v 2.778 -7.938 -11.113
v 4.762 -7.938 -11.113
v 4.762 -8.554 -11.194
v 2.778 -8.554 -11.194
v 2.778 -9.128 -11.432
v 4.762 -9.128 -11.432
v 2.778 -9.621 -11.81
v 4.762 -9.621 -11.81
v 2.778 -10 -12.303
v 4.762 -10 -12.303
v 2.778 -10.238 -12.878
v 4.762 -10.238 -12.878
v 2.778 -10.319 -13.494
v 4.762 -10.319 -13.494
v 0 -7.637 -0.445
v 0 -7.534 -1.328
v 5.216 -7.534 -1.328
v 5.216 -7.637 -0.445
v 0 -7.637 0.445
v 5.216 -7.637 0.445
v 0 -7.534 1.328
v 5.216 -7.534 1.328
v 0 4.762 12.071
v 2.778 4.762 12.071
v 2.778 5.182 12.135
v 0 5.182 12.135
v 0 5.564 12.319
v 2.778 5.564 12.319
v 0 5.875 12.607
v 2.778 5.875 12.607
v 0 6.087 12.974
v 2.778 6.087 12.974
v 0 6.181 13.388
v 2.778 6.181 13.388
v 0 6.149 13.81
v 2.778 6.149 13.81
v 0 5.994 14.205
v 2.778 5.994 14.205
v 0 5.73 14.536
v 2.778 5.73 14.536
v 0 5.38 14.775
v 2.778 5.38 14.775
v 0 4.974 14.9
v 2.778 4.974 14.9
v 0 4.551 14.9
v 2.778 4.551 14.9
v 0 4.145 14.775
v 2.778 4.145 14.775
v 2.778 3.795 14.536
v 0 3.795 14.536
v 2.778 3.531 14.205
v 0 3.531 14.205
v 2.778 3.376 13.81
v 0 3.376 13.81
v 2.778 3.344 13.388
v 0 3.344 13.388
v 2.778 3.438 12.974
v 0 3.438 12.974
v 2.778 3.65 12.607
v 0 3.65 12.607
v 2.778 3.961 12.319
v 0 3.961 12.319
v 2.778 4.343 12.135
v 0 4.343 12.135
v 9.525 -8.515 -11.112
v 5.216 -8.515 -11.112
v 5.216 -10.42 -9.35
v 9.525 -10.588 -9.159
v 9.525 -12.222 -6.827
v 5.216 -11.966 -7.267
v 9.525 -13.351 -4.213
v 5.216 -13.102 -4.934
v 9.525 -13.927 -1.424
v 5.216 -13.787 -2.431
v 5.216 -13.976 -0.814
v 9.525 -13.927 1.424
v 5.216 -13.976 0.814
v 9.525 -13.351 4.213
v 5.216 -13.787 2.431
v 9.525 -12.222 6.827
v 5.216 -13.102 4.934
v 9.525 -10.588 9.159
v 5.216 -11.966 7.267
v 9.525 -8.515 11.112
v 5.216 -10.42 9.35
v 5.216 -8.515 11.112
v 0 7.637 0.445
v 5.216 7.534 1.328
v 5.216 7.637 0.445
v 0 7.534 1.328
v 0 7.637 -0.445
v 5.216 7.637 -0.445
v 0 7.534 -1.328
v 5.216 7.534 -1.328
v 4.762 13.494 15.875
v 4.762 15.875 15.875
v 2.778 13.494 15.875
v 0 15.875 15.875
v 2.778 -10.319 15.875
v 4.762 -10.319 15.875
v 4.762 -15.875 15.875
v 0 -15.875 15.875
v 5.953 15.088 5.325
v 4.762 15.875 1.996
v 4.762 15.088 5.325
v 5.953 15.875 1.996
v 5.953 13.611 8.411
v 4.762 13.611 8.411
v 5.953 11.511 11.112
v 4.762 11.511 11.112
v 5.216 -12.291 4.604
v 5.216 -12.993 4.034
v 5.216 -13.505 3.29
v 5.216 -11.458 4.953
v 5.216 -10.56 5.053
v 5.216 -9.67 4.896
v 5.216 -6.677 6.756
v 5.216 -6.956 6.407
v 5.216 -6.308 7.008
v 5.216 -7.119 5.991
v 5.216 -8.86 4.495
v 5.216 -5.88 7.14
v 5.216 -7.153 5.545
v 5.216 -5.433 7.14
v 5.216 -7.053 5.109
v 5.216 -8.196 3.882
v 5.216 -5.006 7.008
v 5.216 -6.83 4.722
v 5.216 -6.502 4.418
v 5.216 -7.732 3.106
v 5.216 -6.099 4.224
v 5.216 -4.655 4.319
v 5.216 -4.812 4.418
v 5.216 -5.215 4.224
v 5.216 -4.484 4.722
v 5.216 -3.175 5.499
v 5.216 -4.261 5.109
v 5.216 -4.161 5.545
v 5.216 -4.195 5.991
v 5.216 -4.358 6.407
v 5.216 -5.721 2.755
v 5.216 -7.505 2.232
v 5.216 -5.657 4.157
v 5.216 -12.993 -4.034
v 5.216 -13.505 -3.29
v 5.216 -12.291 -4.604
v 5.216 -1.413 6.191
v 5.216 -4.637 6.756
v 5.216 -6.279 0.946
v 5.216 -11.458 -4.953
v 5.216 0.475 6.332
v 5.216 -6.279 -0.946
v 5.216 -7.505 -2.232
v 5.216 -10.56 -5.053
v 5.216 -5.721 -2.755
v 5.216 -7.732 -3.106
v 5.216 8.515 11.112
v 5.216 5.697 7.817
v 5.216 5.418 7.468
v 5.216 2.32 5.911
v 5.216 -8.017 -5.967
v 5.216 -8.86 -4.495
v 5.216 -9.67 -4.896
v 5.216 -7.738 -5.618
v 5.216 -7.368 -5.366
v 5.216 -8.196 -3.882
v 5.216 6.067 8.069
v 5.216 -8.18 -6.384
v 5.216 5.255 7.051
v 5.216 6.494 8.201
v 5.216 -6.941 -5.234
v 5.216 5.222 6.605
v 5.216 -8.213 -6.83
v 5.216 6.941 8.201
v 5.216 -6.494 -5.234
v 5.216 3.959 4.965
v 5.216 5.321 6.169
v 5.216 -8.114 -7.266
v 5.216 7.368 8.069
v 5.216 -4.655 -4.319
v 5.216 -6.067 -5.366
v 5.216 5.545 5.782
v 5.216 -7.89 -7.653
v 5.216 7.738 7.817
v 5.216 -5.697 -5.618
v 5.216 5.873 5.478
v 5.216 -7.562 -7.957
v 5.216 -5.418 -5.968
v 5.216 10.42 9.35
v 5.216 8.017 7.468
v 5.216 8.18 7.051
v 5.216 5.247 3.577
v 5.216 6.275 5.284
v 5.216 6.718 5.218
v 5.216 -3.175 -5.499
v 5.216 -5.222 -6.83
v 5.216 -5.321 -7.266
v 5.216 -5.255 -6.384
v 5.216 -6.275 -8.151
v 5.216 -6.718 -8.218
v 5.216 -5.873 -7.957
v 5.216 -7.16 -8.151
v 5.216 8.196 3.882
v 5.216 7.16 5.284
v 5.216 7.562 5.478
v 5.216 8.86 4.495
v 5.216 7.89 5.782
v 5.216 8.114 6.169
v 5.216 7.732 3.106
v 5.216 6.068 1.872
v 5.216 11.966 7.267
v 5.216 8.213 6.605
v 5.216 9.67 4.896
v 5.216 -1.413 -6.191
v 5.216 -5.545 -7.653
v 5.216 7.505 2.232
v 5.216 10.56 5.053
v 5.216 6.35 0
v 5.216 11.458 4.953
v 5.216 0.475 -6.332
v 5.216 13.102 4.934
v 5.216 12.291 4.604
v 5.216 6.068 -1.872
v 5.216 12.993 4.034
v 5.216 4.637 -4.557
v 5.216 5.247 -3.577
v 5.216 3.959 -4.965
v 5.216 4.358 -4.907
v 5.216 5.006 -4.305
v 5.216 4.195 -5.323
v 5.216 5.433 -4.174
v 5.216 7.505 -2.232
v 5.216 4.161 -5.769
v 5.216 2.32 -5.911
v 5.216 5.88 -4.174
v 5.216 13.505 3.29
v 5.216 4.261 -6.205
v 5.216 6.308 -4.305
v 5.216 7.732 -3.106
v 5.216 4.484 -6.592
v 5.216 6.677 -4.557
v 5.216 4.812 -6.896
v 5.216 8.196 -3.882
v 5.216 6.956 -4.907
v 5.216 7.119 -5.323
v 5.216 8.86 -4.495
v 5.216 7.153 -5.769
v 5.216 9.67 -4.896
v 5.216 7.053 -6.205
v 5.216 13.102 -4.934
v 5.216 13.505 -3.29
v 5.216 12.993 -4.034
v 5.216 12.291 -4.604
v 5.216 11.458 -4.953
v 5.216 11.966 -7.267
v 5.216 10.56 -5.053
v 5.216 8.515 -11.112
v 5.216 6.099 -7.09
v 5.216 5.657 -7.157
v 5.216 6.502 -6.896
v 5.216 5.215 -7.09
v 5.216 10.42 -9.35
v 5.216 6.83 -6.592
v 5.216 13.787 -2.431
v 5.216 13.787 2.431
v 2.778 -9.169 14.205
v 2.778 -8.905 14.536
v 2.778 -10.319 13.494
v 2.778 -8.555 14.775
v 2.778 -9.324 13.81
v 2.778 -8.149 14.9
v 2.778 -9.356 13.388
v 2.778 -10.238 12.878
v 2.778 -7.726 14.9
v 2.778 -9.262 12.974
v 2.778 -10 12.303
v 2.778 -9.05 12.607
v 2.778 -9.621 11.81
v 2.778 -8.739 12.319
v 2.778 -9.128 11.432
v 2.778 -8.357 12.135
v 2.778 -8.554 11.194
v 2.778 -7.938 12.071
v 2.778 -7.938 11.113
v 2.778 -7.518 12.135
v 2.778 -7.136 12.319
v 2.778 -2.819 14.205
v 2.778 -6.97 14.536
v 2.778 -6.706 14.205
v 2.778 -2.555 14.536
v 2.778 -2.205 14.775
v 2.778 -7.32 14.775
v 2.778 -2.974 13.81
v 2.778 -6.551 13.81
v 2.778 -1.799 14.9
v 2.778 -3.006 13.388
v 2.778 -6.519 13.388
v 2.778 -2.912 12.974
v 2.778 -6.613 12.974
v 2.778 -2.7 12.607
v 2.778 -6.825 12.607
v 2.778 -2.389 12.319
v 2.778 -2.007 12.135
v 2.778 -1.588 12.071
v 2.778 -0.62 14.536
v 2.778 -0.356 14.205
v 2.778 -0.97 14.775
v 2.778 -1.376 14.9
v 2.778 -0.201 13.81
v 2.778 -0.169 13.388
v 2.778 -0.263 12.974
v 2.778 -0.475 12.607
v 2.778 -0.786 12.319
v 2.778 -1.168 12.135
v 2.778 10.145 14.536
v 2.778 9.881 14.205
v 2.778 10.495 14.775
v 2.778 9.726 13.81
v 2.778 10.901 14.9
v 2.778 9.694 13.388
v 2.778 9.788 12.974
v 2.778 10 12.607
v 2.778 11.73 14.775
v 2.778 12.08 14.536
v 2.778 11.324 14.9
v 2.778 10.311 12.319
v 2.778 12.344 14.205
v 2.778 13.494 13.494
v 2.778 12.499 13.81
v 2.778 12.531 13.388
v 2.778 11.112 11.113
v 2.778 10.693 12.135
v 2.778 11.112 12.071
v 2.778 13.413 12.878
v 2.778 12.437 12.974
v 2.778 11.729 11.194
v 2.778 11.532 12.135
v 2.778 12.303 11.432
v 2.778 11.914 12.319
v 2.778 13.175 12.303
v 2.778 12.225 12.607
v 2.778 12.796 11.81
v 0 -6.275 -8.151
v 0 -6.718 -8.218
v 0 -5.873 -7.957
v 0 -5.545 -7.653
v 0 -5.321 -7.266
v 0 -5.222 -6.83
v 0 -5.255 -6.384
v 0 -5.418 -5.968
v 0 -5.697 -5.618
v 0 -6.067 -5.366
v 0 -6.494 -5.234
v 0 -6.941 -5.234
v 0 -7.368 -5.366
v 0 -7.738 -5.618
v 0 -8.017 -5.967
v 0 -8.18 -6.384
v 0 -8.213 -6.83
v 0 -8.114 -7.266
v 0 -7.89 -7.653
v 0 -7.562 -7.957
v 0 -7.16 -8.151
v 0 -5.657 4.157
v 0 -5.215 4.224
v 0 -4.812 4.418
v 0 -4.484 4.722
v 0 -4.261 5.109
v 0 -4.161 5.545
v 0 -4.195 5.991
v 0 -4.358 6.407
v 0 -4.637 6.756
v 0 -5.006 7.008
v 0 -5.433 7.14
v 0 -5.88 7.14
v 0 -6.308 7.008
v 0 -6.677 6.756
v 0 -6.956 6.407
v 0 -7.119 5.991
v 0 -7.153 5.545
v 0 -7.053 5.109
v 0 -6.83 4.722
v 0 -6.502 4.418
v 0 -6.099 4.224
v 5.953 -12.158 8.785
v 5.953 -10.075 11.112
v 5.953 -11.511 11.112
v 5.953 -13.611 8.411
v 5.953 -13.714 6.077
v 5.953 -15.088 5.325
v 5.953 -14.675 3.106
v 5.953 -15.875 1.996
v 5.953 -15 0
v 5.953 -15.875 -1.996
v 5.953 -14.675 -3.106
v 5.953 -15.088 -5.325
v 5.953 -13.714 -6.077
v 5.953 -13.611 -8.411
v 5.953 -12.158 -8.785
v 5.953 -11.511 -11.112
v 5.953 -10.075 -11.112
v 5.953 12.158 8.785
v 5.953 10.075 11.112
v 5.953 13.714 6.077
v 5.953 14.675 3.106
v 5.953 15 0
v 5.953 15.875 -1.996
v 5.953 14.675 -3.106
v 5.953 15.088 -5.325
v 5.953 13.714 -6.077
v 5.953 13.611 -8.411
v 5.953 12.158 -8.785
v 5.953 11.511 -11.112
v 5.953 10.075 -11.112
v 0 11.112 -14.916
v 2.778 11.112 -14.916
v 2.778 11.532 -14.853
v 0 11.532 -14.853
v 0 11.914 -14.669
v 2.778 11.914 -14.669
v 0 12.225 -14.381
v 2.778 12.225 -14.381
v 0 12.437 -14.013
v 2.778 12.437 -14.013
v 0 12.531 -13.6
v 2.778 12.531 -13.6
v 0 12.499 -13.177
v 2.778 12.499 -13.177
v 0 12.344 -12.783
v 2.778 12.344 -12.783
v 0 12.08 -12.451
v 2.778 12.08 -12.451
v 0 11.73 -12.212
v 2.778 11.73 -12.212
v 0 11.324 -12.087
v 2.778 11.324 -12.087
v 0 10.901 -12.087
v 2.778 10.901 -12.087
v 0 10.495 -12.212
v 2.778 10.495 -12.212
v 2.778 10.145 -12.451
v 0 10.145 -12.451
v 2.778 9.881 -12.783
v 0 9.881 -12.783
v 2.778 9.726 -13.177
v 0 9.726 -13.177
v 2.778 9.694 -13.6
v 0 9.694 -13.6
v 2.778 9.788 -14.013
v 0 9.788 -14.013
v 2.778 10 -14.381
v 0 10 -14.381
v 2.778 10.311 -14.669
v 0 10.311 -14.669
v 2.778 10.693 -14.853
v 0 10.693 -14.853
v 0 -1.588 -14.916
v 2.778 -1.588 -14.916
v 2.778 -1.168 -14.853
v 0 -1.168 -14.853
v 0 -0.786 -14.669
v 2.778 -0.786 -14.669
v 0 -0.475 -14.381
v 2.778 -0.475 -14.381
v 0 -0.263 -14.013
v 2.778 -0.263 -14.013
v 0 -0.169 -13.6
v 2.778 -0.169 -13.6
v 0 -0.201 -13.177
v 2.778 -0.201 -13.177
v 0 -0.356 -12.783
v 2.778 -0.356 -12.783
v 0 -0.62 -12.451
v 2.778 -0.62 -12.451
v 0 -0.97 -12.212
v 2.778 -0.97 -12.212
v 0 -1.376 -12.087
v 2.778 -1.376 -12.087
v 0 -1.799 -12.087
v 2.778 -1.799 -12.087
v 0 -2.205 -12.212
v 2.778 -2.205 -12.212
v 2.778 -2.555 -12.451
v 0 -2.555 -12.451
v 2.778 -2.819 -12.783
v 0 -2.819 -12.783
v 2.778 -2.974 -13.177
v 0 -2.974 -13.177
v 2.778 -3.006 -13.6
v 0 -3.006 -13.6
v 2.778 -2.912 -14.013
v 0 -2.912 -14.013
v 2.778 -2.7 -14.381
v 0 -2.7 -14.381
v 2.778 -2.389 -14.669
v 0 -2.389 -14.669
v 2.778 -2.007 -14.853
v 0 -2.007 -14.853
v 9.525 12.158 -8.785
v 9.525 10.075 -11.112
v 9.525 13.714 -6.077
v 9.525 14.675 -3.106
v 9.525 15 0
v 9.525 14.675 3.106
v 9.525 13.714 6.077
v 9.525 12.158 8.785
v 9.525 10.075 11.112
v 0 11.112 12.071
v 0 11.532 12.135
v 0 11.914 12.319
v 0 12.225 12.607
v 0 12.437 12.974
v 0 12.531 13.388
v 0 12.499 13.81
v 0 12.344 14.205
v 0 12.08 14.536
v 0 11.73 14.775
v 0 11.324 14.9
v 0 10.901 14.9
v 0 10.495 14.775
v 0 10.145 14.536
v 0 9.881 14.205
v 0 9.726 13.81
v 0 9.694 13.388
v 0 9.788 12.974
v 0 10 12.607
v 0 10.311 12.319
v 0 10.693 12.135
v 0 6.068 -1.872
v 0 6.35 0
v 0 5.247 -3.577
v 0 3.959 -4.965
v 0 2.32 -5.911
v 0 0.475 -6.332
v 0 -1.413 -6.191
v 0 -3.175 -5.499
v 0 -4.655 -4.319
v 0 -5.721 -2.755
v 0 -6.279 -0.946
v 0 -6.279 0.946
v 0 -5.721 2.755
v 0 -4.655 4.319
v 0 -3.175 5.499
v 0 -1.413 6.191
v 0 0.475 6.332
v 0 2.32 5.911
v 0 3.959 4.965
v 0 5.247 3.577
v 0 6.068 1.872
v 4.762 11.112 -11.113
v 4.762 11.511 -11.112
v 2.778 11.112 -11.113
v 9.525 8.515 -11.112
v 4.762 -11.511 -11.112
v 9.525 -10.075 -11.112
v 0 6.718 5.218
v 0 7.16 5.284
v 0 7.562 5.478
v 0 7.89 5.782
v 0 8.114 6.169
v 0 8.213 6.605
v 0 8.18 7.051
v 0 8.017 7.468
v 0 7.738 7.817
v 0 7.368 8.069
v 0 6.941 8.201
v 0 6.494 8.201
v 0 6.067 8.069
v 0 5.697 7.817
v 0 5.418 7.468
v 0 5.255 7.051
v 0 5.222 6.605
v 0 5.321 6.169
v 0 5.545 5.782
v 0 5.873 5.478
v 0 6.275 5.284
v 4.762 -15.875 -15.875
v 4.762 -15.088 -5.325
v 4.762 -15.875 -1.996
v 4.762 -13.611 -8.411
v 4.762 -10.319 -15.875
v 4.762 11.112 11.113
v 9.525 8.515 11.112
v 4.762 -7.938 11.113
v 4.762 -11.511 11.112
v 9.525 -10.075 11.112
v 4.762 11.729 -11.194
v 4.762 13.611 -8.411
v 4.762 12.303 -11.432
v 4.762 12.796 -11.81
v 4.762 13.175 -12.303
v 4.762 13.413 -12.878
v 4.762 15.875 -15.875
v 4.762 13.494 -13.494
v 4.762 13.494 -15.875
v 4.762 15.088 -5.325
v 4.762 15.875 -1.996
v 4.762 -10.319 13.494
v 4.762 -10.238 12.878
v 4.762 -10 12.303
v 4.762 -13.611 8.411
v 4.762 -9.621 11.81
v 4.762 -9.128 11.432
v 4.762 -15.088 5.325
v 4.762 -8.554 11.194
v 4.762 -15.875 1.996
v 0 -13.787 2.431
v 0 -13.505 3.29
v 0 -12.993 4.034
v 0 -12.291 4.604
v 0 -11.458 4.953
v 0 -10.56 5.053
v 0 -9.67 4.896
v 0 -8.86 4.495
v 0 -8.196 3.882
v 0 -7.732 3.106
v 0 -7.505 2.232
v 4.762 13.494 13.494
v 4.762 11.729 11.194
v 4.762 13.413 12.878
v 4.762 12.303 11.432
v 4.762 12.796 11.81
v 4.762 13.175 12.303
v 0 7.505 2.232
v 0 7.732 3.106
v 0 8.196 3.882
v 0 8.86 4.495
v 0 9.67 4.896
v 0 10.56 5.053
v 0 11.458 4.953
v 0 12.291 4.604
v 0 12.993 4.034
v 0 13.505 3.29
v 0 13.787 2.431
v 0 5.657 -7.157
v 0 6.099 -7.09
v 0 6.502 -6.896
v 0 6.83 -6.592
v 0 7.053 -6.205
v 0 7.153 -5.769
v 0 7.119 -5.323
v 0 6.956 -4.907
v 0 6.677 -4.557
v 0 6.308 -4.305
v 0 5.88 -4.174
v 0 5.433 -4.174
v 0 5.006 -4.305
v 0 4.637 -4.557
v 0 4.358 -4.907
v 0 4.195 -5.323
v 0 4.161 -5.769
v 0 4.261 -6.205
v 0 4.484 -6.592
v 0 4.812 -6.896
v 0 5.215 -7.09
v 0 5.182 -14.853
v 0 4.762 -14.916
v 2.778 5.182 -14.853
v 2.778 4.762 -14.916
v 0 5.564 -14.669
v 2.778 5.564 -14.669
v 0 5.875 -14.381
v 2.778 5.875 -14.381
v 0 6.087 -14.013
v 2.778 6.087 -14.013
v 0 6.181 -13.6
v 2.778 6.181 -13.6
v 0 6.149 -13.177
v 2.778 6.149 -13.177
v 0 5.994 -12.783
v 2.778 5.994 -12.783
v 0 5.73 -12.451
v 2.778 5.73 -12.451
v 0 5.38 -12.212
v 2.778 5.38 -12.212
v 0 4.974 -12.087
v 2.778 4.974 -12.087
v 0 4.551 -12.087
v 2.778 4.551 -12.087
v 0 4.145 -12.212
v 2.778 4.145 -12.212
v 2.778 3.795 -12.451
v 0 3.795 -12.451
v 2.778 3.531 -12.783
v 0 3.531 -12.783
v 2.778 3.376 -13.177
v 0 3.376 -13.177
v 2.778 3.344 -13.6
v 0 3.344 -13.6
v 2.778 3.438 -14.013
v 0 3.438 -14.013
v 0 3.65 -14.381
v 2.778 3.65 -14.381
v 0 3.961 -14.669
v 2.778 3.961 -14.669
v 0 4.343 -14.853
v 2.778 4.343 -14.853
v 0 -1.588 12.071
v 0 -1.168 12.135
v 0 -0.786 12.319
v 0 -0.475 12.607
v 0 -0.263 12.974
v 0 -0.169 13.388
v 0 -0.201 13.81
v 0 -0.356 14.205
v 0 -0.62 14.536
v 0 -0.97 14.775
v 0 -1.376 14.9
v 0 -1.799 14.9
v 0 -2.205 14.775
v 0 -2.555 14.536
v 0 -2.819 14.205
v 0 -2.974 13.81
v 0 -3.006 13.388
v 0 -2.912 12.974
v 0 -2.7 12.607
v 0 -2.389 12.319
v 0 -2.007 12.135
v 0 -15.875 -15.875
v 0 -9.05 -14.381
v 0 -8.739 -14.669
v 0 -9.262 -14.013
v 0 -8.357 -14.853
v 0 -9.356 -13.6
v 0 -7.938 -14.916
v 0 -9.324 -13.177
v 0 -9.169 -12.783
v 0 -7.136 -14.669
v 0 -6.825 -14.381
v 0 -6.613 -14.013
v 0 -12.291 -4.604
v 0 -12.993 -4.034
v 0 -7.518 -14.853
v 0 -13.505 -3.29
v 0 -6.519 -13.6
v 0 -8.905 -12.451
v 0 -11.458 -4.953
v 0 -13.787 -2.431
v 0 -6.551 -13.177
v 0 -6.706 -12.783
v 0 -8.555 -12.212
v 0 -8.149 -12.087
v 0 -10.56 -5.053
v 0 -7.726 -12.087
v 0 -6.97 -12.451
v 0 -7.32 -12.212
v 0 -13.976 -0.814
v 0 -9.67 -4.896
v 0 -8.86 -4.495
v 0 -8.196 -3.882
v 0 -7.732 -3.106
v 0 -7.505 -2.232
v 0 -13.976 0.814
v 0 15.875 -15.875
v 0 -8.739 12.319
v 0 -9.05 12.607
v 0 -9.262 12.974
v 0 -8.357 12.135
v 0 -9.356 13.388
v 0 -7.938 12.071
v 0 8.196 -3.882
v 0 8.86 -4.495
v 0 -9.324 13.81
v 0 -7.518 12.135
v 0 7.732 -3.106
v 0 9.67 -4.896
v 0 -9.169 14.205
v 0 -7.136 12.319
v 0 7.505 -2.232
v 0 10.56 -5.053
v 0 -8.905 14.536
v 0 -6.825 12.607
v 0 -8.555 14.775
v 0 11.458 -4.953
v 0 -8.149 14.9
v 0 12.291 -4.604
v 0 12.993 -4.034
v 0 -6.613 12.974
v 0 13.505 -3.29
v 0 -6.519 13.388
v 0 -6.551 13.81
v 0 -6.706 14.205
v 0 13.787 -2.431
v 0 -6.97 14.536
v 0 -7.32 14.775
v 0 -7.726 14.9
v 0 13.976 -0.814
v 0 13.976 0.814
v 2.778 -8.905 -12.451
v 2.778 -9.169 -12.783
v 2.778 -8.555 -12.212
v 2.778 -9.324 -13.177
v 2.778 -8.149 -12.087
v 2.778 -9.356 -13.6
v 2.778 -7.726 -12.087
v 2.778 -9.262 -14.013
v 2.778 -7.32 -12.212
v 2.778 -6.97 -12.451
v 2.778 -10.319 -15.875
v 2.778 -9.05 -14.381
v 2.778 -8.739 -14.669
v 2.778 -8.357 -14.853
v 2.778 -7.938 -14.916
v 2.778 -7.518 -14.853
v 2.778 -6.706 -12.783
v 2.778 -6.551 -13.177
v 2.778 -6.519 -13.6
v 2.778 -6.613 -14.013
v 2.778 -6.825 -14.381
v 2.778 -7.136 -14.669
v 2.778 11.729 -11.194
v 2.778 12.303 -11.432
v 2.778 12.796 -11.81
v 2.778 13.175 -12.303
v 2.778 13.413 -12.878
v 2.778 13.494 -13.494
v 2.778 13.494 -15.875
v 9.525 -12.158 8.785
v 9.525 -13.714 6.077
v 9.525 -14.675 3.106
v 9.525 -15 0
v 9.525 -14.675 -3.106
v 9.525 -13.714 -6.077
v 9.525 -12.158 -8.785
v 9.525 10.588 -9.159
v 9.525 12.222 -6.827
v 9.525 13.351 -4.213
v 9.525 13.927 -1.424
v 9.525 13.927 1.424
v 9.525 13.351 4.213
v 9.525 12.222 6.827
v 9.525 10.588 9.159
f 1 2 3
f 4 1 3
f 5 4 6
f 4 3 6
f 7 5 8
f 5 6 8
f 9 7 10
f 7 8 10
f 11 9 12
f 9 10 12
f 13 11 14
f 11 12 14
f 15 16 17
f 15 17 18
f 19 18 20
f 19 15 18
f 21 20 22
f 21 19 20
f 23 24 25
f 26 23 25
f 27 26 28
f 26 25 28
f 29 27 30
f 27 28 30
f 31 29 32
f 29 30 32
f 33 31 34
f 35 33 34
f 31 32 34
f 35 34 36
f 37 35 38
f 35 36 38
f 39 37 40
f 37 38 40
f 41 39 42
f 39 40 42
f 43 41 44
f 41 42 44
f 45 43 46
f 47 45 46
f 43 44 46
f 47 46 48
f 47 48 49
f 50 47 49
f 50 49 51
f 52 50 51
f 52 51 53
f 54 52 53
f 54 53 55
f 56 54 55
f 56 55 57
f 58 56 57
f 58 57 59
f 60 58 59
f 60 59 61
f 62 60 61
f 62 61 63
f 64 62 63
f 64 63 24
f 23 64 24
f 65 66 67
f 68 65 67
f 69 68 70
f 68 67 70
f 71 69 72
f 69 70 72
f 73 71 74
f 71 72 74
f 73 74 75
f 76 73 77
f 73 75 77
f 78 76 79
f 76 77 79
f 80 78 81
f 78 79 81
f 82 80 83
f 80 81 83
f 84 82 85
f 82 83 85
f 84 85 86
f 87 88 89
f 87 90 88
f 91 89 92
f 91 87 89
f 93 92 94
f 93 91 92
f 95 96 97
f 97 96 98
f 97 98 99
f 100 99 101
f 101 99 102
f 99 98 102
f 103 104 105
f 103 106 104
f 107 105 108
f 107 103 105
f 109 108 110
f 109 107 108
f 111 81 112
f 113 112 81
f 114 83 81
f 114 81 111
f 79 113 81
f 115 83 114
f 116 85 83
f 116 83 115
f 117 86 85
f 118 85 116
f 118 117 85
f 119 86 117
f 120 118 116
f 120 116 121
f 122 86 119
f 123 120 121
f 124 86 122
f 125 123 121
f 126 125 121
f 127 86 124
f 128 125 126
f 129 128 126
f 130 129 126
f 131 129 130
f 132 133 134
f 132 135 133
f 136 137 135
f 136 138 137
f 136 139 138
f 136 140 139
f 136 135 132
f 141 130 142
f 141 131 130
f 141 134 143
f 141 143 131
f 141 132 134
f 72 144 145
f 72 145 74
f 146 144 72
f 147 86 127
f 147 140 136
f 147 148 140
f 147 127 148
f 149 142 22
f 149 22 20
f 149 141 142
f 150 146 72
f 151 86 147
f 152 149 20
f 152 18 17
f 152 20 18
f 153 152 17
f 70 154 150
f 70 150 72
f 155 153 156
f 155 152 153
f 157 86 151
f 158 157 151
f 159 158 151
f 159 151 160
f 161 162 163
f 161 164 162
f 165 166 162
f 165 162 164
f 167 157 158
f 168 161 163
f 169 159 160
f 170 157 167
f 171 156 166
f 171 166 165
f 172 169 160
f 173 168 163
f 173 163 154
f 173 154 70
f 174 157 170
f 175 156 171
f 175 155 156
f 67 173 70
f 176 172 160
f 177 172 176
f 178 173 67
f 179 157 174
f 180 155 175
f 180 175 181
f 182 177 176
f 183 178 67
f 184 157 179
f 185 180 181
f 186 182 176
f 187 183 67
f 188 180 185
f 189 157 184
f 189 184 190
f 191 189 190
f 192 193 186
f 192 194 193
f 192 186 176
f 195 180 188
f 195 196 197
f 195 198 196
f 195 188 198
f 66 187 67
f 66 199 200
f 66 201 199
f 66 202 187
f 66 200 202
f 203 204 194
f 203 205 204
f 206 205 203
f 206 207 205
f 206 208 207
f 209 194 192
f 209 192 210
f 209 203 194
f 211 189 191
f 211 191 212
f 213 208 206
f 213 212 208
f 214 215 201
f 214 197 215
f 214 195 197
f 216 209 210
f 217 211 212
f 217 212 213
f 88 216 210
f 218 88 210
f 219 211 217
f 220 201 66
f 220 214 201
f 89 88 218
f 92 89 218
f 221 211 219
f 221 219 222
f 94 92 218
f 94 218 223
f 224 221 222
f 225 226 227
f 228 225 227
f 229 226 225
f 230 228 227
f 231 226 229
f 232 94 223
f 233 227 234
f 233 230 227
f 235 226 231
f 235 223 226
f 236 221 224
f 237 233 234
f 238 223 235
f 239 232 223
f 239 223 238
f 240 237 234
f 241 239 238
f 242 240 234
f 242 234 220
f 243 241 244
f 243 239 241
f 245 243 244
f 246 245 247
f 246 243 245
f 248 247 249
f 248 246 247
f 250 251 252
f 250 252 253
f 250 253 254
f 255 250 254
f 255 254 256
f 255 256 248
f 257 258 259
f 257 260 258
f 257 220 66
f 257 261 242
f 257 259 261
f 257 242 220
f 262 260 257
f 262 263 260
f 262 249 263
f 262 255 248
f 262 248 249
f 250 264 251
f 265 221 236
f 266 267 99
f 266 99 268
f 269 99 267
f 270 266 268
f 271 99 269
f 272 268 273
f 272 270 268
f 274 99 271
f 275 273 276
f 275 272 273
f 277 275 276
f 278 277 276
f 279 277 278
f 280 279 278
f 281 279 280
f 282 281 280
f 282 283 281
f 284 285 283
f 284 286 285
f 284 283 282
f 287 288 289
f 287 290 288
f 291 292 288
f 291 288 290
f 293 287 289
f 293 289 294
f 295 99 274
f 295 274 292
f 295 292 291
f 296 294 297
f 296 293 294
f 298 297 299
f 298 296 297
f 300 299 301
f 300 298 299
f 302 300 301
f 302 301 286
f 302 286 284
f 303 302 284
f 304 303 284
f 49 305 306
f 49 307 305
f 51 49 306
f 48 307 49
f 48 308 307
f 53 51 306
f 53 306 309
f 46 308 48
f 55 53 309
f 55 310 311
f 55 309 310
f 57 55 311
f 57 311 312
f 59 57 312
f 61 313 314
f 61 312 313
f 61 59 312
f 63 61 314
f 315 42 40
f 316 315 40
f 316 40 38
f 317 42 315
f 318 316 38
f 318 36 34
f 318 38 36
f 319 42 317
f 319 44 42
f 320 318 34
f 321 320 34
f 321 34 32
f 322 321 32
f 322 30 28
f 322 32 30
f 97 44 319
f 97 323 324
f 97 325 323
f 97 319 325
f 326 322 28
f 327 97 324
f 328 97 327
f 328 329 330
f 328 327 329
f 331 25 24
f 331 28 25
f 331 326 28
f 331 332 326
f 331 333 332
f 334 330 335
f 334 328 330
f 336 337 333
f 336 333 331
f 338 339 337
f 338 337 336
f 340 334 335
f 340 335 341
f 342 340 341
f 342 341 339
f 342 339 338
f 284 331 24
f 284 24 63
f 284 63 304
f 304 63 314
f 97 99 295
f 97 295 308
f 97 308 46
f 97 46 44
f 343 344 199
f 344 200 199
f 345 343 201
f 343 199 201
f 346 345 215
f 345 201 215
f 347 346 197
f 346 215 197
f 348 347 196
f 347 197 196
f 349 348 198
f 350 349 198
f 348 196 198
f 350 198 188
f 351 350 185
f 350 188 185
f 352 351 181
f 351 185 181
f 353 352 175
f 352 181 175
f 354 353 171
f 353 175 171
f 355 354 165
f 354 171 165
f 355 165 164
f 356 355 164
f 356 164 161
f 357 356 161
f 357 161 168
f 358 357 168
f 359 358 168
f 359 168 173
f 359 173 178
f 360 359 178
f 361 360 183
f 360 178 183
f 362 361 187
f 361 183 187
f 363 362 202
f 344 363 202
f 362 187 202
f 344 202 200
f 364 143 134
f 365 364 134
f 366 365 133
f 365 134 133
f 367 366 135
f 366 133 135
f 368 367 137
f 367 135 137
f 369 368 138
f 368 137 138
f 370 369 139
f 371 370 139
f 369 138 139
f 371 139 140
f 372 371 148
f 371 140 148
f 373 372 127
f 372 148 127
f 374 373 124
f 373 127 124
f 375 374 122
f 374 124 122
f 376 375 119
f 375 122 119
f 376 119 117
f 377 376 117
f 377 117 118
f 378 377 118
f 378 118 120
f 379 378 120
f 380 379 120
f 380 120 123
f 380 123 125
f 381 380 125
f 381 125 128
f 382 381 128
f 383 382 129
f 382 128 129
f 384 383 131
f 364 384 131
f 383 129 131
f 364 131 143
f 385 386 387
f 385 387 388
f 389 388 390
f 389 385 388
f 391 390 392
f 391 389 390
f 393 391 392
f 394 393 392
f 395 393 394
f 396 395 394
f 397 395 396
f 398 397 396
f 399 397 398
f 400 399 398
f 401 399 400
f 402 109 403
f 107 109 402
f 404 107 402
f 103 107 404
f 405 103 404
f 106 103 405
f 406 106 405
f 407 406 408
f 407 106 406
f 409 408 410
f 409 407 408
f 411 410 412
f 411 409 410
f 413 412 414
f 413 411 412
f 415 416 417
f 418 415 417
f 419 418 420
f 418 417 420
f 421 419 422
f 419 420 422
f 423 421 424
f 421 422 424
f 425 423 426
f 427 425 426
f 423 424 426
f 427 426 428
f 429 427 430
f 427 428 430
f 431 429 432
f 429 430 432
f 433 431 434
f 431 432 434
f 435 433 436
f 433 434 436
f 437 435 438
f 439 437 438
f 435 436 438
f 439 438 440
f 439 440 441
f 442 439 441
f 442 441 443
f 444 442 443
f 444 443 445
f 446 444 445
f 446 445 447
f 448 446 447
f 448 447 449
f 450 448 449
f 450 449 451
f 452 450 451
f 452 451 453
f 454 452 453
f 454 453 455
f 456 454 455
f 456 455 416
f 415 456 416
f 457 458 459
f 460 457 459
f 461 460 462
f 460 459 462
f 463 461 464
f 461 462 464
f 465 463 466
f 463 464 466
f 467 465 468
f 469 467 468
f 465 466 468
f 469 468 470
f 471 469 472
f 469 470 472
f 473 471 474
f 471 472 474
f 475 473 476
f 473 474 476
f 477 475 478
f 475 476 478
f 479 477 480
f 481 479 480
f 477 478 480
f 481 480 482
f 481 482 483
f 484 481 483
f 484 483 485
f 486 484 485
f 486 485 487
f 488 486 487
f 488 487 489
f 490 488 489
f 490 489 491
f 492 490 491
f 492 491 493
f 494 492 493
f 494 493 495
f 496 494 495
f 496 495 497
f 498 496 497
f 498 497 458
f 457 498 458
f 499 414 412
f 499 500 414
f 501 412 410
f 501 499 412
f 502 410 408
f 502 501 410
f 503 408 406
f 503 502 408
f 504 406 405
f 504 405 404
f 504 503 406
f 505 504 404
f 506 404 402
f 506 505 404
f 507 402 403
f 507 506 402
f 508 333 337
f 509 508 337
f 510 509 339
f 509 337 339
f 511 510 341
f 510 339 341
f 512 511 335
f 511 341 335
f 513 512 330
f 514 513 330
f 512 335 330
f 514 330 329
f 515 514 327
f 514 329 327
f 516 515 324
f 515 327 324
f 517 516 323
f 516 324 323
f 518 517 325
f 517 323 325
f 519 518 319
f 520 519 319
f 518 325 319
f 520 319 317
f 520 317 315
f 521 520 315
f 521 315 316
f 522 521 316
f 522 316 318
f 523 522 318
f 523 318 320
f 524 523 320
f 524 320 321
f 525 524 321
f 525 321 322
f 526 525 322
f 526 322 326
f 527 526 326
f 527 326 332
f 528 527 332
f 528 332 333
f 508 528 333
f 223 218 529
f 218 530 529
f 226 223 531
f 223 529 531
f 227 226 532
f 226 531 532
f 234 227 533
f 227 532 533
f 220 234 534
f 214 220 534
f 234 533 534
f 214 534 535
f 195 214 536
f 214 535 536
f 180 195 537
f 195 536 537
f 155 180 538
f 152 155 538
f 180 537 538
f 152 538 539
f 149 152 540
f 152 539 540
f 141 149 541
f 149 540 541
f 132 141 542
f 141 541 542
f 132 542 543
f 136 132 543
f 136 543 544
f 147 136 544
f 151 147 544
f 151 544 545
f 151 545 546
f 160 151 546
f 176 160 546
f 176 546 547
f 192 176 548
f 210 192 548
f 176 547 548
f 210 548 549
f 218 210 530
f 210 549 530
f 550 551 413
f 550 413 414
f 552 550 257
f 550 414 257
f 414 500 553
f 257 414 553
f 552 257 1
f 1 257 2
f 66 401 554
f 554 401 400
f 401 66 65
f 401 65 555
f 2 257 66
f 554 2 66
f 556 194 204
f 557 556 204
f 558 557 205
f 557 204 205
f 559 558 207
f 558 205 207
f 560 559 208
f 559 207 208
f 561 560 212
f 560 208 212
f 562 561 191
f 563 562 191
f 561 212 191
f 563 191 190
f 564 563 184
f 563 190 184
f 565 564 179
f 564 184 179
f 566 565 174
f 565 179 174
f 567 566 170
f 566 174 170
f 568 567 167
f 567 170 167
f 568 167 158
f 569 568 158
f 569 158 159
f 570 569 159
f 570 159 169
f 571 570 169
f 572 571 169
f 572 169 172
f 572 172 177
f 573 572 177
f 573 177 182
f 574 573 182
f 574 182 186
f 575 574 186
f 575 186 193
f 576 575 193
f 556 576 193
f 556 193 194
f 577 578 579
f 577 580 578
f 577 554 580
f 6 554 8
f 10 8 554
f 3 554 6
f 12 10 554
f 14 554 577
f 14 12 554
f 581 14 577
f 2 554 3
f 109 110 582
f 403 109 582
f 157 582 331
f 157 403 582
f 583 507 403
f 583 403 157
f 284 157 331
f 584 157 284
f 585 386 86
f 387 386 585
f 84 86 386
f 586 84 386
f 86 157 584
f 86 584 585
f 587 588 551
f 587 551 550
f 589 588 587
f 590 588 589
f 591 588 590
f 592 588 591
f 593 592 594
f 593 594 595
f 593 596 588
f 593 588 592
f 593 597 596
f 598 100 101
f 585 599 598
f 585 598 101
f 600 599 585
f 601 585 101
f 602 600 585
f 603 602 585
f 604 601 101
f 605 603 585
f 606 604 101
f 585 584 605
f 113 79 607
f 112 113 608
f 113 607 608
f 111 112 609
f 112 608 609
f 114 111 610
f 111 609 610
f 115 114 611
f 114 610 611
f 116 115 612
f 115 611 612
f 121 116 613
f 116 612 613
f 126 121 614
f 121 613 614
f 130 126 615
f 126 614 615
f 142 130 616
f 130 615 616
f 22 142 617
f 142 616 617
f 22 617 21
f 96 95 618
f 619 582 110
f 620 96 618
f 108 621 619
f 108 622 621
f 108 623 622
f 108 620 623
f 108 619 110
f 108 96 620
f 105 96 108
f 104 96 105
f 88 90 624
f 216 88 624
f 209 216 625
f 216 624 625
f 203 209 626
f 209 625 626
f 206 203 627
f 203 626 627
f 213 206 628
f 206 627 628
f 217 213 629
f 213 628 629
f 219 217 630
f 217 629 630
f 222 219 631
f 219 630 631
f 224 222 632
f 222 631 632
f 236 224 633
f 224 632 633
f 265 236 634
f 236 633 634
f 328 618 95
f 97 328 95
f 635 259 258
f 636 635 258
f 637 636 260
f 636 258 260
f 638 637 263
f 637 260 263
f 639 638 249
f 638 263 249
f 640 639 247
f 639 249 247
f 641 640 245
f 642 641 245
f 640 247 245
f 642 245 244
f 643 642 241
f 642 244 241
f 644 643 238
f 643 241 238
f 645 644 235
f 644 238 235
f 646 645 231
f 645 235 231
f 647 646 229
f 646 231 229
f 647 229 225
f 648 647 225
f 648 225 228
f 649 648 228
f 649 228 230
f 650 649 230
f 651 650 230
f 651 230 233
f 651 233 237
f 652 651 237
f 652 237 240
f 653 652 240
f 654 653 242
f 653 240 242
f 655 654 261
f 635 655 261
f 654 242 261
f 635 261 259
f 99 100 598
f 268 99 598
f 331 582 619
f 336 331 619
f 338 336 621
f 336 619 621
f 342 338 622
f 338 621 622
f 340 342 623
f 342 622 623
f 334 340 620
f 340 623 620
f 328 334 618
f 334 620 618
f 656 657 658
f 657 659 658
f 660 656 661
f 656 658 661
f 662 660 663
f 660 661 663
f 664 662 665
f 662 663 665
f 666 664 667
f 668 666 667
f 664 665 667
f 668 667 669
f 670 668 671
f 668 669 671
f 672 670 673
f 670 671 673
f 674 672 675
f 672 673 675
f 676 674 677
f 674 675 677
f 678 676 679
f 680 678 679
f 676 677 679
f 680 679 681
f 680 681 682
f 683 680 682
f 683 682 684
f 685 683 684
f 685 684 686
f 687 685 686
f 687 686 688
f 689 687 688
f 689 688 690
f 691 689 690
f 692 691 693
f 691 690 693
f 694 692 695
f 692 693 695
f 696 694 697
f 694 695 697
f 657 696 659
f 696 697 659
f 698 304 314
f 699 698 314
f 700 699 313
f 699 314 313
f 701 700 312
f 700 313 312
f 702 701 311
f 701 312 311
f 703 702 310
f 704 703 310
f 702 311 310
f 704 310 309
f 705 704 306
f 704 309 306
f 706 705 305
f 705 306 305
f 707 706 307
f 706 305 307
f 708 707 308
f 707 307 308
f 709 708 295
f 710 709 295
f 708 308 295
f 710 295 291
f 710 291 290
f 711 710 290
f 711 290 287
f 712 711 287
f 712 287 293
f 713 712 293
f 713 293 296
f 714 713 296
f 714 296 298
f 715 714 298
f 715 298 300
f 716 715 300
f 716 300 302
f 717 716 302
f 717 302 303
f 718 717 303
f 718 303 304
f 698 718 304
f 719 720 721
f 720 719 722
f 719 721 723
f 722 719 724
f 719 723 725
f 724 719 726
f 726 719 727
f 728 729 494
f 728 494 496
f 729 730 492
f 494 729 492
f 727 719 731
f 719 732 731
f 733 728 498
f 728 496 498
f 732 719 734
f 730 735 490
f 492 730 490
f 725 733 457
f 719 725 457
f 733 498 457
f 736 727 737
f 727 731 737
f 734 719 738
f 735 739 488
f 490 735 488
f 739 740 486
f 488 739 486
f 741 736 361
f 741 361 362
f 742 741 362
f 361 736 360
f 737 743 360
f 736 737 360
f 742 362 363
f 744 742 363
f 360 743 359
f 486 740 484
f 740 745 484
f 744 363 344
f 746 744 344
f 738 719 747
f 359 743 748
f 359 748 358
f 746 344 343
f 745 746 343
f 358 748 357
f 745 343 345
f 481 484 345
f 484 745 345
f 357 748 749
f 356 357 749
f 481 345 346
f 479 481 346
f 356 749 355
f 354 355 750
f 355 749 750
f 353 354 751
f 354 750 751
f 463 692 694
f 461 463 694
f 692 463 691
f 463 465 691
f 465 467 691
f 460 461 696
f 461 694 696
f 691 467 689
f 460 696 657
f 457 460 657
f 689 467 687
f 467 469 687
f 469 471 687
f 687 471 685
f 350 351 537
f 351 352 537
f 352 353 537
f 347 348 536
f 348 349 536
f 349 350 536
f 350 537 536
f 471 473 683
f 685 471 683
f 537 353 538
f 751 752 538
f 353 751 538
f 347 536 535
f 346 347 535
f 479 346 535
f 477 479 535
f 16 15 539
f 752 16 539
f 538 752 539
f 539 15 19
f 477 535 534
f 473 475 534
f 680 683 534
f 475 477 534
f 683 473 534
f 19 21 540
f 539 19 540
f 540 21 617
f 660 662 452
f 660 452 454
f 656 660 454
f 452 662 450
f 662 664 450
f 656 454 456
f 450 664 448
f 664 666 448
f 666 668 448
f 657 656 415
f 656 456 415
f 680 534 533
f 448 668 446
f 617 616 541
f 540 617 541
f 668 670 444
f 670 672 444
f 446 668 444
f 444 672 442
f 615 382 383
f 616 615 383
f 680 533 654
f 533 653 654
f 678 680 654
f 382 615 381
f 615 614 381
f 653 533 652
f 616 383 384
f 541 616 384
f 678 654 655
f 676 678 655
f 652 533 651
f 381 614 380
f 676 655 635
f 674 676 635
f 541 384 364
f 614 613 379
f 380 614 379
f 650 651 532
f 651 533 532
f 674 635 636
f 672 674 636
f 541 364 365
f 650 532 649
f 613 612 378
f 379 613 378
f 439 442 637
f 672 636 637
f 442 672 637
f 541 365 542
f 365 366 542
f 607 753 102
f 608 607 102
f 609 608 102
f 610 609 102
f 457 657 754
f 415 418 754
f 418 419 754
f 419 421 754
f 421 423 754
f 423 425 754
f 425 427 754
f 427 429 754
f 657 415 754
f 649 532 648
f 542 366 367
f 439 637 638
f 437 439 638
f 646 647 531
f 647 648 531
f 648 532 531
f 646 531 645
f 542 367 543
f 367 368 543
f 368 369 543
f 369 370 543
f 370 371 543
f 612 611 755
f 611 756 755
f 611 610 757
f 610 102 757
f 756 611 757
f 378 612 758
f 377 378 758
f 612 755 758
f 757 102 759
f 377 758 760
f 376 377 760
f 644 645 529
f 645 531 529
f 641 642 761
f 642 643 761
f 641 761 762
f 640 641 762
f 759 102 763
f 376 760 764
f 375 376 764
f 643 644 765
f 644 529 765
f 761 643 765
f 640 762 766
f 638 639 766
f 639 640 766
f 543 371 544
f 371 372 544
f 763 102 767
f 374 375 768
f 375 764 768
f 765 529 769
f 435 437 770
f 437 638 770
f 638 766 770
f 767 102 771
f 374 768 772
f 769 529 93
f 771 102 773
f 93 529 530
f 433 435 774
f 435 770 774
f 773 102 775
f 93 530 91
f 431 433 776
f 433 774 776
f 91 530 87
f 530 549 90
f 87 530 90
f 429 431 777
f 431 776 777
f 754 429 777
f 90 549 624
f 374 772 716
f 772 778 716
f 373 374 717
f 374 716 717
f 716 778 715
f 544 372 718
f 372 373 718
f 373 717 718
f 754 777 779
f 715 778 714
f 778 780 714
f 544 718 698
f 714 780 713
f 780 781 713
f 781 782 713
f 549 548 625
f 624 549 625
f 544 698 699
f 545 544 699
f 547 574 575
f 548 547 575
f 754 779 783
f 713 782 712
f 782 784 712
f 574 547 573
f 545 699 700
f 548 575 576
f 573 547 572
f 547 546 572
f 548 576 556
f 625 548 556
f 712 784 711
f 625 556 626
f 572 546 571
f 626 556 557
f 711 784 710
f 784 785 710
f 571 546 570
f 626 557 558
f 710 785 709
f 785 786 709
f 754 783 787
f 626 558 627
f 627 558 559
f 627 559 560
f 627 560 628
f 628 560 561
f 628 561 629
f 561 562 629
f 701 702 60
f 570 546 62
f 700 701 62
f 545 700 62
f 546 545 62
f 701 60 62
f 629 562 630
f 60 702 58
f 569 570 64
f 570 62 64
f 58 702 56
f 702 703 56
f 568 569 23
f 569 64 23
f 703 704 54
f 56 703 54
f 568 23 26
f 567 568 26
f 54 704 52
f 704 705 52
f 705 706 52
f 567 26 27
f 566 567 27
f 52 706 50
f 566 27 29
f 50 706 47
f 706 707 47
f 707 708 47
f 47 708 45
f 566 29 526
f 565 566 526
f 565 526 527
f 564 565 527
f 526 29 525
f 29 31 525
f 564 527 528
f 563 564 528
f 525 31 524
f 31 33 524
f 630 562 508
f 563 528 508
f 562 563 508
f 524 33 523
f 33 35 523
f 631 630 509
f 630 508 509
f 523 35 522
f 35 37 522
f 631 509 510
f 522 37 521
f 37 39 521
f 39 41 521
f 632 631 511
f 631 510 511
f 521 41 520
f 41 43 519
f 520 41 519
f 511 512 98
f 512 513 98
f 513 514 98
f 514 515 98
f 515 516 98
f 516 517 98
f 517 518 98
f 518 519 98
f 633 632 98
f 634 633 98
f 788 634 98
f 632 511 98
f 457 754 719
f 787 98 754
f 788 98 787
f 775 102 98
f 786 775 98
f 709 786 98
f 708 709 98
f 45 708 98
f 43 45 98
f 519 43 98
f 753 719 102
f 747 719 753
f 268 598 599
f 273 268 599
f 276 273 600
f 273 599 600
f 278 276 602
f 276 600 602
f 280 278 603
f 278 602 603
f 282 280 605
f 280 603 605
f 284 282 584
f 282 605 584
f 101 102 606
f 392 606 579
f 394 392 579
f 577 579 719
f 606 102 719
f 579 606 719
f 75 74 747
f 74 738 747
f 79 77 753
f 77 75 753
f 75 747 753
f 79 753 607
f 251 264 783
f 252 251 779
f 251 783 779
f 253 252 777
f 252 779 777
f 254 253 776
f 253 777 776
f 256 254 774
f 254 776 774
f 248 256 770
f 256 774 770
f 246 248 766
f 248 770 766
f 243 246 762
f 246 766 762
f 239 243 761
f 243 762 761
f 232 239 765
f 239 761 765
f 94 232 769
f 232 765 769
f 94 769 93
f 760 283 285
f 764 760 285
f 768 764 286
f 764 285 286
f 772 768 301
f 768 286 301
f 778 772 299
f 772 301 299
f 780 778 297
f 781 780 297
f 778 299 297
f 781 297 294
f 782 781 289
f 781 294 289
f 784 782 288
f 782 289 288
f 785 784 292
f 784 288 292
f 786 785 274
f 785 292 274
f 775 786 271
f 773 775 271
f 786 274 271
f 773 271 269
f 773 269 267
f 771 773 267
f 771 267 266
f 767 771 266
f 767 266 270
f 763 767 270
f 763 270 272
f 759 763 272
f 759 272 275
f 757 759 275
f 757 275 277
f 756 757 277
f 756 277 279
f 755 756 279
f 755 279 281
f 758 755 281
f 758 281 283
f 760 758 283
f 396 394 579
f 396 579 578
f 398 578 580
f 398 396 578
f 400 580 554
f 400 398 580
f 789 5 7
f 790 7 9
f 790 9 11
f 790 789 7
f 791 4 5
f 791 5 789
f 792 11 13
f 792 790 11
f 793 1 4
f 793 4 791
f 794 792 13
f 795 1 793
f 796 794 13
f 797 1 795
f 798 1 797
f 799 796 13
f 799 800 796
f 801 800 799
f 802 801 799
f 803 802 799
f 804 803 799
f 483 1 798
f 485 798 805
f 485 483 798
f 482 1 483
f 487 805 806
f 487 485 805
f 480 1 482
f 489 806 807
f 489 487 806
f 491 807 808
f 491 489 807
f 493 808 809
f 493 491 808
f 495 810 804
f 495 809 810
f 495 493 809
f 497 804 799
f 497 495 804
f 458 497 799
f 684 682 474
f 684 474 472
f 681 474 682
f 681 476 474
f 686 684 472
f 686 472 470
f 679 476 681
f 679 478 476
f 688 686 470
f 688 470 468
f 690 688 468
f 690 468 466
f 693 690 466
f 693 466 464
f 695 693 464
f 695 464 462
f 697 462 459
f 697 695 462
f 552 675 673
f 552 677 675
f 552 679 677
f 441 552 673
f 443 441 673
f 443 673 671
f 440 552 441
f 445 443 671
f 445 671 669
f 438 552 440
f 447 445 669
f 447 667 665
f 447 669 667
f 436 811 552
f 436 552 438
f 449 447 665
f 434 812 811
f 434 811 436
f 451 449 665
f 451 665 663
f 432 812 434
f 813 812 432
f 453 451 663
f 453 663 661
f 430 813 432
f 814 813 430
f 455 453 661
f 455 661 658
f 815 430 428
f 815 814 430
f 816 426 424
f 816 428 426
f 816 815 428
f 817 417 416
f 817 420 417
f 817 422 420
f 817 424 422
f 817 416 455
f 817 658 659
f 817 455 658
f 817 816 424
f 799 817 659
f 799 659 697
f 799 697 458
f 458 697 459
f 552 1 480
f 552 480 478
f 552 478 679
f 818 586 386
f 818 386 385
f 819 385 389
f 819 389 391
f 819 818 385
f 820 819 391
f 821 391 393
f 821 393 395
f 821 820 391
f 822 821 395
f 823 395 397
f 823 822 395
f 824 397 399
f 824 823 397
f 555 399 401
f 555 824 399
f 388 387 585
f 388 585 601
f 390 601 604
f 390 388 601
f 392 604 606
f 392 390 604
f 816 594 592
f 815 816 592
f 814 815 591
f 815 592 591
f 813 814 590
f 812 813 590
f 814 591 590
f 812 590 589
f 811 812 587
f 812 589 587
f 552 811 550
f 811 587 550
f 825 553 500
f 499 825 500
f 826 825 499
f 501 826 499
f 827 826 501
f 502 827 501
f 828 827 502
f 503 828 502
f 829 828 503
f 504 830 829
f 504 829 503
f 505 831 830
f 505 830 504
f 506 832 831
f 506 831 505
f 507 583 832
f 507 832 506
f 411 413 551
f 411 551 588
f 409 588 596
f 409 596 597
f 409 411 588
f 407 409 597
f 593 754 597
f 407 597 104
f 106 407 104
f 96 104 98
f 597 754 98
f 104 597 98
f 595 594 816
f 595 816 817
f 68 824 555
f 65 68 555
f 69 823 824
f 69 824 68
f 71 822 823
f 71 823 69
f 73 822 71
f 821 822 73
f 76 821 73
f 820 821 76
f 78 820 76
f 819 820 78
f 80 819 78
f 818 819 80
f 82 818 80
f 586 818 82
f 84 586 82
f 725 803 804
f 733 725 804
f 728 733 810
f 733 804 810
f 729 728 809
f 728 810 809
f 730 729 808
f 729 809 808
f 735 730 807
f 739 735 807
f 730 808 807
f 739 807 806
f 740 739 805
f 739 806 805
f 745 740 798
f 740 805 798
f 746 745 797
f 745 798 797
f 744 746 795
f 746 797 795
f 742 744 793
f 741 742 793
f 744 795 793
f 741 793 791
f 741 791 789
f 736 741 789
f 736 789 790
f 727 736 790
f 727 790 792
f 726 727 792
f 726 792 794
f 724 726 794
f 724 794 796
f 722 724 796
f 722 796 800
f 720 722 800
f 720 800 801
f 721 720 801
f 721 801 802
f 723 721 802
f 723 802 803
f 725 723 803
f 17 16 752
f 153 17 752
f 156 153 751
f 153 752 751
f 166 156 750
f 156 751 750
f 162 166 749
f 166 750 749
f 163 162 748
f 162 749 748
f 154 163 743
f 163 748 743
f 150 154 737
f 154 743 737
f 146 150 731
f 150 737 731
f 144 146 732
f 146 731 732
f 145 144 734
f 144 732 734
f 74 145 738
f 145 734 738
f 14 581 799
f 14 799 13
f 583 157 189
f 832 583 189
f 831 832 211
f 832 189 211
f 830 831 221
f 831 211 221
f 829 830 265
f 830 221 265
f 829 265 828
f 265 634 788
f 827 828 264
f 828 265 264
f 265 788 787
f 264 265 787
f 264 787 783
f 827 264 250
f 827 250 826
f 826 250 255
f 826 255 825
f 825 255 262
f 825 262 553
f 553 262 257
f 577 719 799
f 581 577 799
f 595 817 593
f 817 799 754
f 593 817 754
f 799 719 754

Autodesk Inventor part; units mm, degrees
ref_plane "YZ Plane" through (0, 0, 0) normal (1, 0, 0) x (0, 1, 0)
ref_plane "XZ Plane" through (0, 0, 0) normal (0, 1, 0) x (-1, 0, 0)
ref_plane "XY Plane" through (0, 0, 0) normal (0, 0, 1) x (1, 0, 0)
sketch "Sketch4" plane through (0, 0, 0) normal (1, 0, 0) x (0, 1, 0)
  line L0 (15.875, 15.875) -> (-15.875, 15.875)
  line L1 (-15.875, 15.875) -> (-15.875, -15.875)
  line L2 (-15.875, -15.875) -> (15.875, -15.875)
  line L3 (15.875, -15.875) -> (15.875, 15.875)
  line L4 (15.875, 15.875) -> (-15.875, -15.875) construction
  line L5 (-15.875, 15.875) -> (15.875, -15.875) construction
  circle A0 centre (0, 0) radius 6.35
  line L6 (0, 0) -> (0, 15.875) construction
  line L7 (0, 22.4506) -> (-22.4506, 0)
  line L8 (-22.4506, 0) -> (0, -22.4506)
  line L9 (0, -22.4506) -> (22.4506, 0)
  line L10 (22.4506, 0) -> (0, 22.4506)
  line L11 (0, 22.4506) -> (0, -22.4506) construction
  line L12 (-22.4506, 0) -> (22.4506, 0) construction
  point P0 (15.875, 6.5756)
  point P1 (6.5756, 15.875)
  point P2 (-6.5756, 15.875)
  point P3 (-15.875, 6.5756)
  point P4 (-15.875, -6.5756)
  point P5 (-6.5756, -15.875)
  point P6 (6.5756, -15.875)
  point P7 (15.875, -6.5756)
  dimension "d37" = 31.75
  dimension "d38" = 31.75
  dimension "d39" = 12.7
  dimension "d126" = 31.75
  dimension "d127" = 31.75
  dimension "d128" = 45
extrude "Extrusion5" add sketch "Sketch4" along normal blind 9.525 contours L3 L10 L0 | L10 L3 L9 L2 L8 L1 L7 L0 | L7 L1 L0 | L3 L2 L9 | L8 L2 L1
sketch "Sketch5" plane through (9.525, 0, 0) normal (1, 0, 0) x (0, 0, -1)
  circle A0 centre (0, 0) radius 25.4
  circle A1 centre (0, 0) radius 15
  circle A2 centre (0, 0) radius 14
  circle A3 centre (0, 0) radius 16
  dimension "d50" = 50.8
  dimension "d51" = 30
  dimension "d52" = 1
  dimension "d55" = 1
extrude "Extrusion6" cut sketch "Sketch5" against normal blind 3.5719 contours A0 | A3
extrude "Extrusion7" cut sketch "Sketch5" against normal blind 4.7625 contours A0
sketch "Sketch7" plane through (9.525, 0, 0) normal (1, 0, 0) x (0, 0, -1)
  circle A0 centre (0, 0) radius 14
  circle A1 centre (0, 0) radius 15 projected
  dimension "d97" = 1
extrude "Extrusion10" cut sketch "Sketch7" against normal blind 4.3094 contours A0
sketch "Sketch8" plane through (5.2156, 0, 0) normal (1, 0, 0) x (0, 0, -1)
  circle A0 centre (0, 0) radius 8 construction
  line L0 (0, 0) -> (8, 0) construction
  line L1 (0, 0) -> (5.6569, 5.6569) construction
  circle A1 centre (5.6569, 5.6569) radius 1.5
  circle A2 centre (0, 0) radius 9.5 construction
  line L2 (0, 0) -> (6.7175, -6.7175) construction
  circle A3 centre (6.7175, -6.7175) radius 1.5
  circle A4 centre (-6.7175, 6.7175) radius 1.5
  circle A5 centre (-5.6569, -5.6569) radius 1.5
  arc A6 (-1.8797, -10.6605) -> (1.8797, -10.6605) centre (0, 0) ccw construction
  arc A7 (-2.4311, -13.7873) -> (2.4311, -13.7873) centre (0, 0) ccw
  arc A8 (-1.3284, -7.5338) -> (1.3284, -7.5338) centre (0, 0) ccw
  arc A9 (-1.3284, -7.5338) -> (-2.4311, -13.7873) centre (-1.8797, -10.6605) ccw
  arc A10 (2.4311, -13.7873) -> (1.3284, -7.5338) centre (1.8797, -10.6605) ccw
  circle A11 centre (0, 0) radius 14 projected
  line L3 (0, -10.825) -> (0, 0) construction
  line L4 (1.8797, -10.6605) -> (0, 0) construction
  arc A12 (1.8797, 10.6605) -> (-1.8797, 10.6605) centre (0, 0) ccw construction
  arc A13 (-2.4311, 13.7873) -> (-1.3284, 7.5338) centre (-1.8797, 10.6605) ccw
  arc A14 (2.4311, 13.7873) -> (-2.4311, 13.7873) centre (0, 0) ccw
  arc A15 (1.3284, 7.5338) -> (2.4311, 13.7873) centre (1.8797, 10.6605) ccw
  arc A16 (1.3284, 7.5338) -> (-1.3284, 7.5338) centre (0, 0) ccw
  point P0 (0, 10.825)
  point P1 (2.4311, 13.7873)
  point P2 (-2.4311, 13.7873)
  dimension "d150" = 19
  dimension "d70" = 16
  dimension "d71" = 3
  dimension "d72" = 45
  dimension "d151" = 3
  dimension "d154" = 360
  dimension "d169" = 3.175
  dimension "d170" = 45
  dimension "d171" = 10
  dimension "d174" = 360
extrude "Extrusion11" cut sketch "Sketch8" along normal through all both and the other way through all contours A1 | A3 | A4 | A5 | A9 A8 A10 A7 | A11 A15 A16 A13
sketch "Sketch14" plane through (9.525, 0, 0) normal (1, 0, 0) x (0, 0, -1)
  line L0 (15.875, -15.875) -> (15.875, 15.875) projected
  line L1 (-15.875, -15.875) -> (15.875, -15.875) projected
  line L2 (15.875, 15.875) -> (11.1125, 15.875)
  line L3 (11.1125, 15.875) -> (11.1125, -15.875)
  line L4 (11.1125, -15.875) -> (15.875, -15.875)
  line L5 (15.875, -15.875) -> (15.875, 15.875)
  line L6 (15.875, 15.875) -> (-15.875, 15.875) projected
  line L7 (-1.9961, -15.875) -> (-15.875, -15.875) projected
  line L8 (-15.875, 15.875) -> (-11.1125, 15.875)
  line L9 (-11.1125, 15.875) -> (-11.1125, -15.875)
  line L10 (-11.1125, -15.875) -> (-15.875, -15.875)
  line L11 (-15.875, -15.875) -> (-15.875, 15.875)
  point P0 (0, 0)
  point P1 (-11.1125, -15.875)
  dimension "d206" = 4.7625
  dimension "d207" = 4.7625
extrude "Extrusion17" cut sketch "Sketch14" against normal up to surface (4.7625 mm away) contours L1 L3 L2 L0 | L9 L1 L11 L6
sketch "Sketch15" plane through (9.525, 0, 0) normal (1, 0, 0) x (0, 0, -1)
  line L0 (15.875, -15.875) -> (15.875, 15.875) projected
  line L1 (15.875, 13.4938) -> (11.1125, 13.4938)
  line L2 (11.1125, 13.4938) -> (11.1125, -13.4938)
  line L3 (11.1125, -13.4938) -> (15.875, -13.4938)
  line L4 (15.875, -13.4938) -> (15.875, 13.4938)
  line L5 (-1.9961, 15.875) -> (1.9961, 15.875) projected
  line L6 (0, 15.875) -> (0, -15.875) construction
  line L7 (-15.875, -15.875) -> (15.875, -15.875) projected
  line L8 (13.4938, 13.4938) -> (13.4938, -13.4938) construction
  circle A0 centre (13.4938, 11.1125) radius 1.4224
  circle A1 centre (13.4938, 4.7625) radius 1.4224
  circle A2 centre (13.4938, -1.5875) radius 1.4224
  circle A3 centre (13.4938, -7.9375) radius 1.4224
  line L9 (15.875, 0) -> (11.1125, 0) construction
  line L10 (-15.875, 13.4938) -> (-11.1125, 13.4938)
  line L11 (-11.1125, 13.4938) -> (-11.1125, -13.4938)
  line L12 (-11.1125, -13.4938) -> (-15.875, -13.4938)
  line L13 (-15.875, -13.4938) -> (-15.875, 13.4938)
  line L14 (-13.4938, 13.4938) -> (-13.4938, -13.4938) construction
  circle A4 centre (-13.4938, 11.1125) radius 1.4224
  circle A5 centre (-13.4938, 4.7625) radius 1.4224
  circle A6 centre (-13.4938, -1.5875) radius 1.4224
  circle A7 centre (-13.4938, -7.9375) radius 1.4224
  line L15 (-15.875, 0) -> (-11.1125, 0) construction
  point P0 (0, 0)
  point P1 (0, 0)
  dimension "d210" = 4.7625
  dimension "d211" = 26.9875
  dimension "d212" = 2.8448
  dimension "d213" = 2.3813
  dimension "d216" = 6.35
extrude "Extrusion18" cut sketch "Sketch15" against normal through all contours A0 | A1 | A2 | A3 | A4 | A5 | A6 | A7
sketch "Sketch16" plane through (5.9531, 0, 0) normal (1, 0, 0) x (0, 0, -1)
  circle A0 centre (-13.4938, -1.5875) radius 1.4224 construction
  circle A1 centre (-13.4938, 4.7625) radius 1.4224 construction
  circle A2 centre (-13.4938, -7.9375) radius 1.4224 construction
  circle A3 centre (-13.4938, 11.1125) radius 1.4224 construction
  line L0 (-1.9961, -15.875) -> (-15.875, -15.875) construction
  arc A4 (-11.1125, -11.5114) -> (-1.9961, -15.875) centre (0, 0) ccw construction
  line L1 (-11.1125, 11.5114) -> (-11.1125, -11.5114) projected
  arc A5 (-1.9961, 15.875) -> (-11.1125, 11.5114) centre (0, 0) ccw construction
  line L2 (-15.875, 15.875) -> (-1.9961, 15.875) construction
  line L3 (-15.875, -15.875) -> (-15.875, 15.875) construction
  circle A6 centre (13.4938, 4.7625) radius 1.4224 construction
  circle A7 centre (13.4938, -1.5875) radius 1.4224 construction
  circle A8 centre (13.4938, 11.1125) radius 1.4224 construction
  circle A9 centre (13.4938, -7.9375) radius 1.4224 construction
  line L4 (1.9961, 15.875) -> (15.875, 15.875) construction
  arc A10 (11.1125, 11.5114) -> (1.9961, 15.875) centre (0, 0) ccw construction
  line L5 (11.1125, -11.5114) -> (11.1125, 11.5114) projected
  arc A11 (1.9961, -15.875) -> (11.1125, -11.5114) centre (0, 0) ccw construction
  line L6 (15.875, -15.875) -> (1.9961, -15.875) construction
  line L7 (15.875, 15.875) -> (15.875, -15.875) construction
  circle A12 centre (-13.4938, -7.9375) radius 2.3812
  circle A13 centre (-13.4938, -1.5875) radius 2.3812
  circle A14 centre (-13.4938, 4.7625) radius 2.3812
  circle A15 centre (-13.4938, 11.1125) radius 2.3812
  circle A16 centre (13.4938, -7.9375) radius 2.3812
  circle A17 centre (13.4938, -1.5875) radius 2.3812
  circle A18 centre (13.4938, 4.7625) radius 2.3812
  circle A19 centre (13.4938, 11.1125) radius 2.3812
  line L8 (15.875, 15.875) -> (15.875, -15.875) projected
  line L9 (13.4938, 13.4937) -> (15.875, 13.4937)
  line L10 (15.875, 13.4937) -> (15.875, -10.3188)
  line L11 (15.875, -10.3188) -> (13.4938, -10.3188)
  line L12 (13.4938, -10.3188) -> (13.4938, 13.4937) construction
  line L13 (-15.875, -15.875) -> (-15.875, 15.875) projected
  line L14 (-13.4938, 13.4937) -> (-15.875, 13.4937)
  line L15 (-15.875, 13.4937) -> (-15.875, -10.3188)
  line L16 (-15.875, -10.3188) -> (-13.4938, -10.3188)
  line L17 (-13.4938, -10.3188) -> (-13.4938, 13.4937) construction
  point P0 (-15.875, -7.9375)
  point P1 (-15.875, -1.5875)
  point P2 (-11.1125, -7.9375)
  point P3 (-11.1125, -1.5875)
  point P4 (-15.875, 4.7625)
  point P5 (-11.1125, 4.7625)
  point P6 (-15.875, 11.1125)
  point P7 (-11.1125, 11.1125)
  point P8 (15.875, -7.9375)
  point P9 (15.875, -1.5875)
  point P10 (11.1125, -1.5875)
  point P11 (11.1125, -7.9375)
  point P12 (15.875, 4.7625)
  point P13 (11.1125, 4.7625)
  point P14 (15.875, 11.1125)
  point P15 (11.1125, 11.1125)
  dimension "d223" = 4.7625
  dimension "d224" = 6.35
  dimension "d225" = 26.9875
  dimension "d228" = 6.35
  dimension "d231" = 26.9875
extrude "Extrusion19" cut sketch "Sketch16" against normal blind 3.175
equation "\"d37\" = d38"
equation "\"d126\" = d37"
equation "\"d127\" = d126"
properties part number "Motor Plate" material "Aluminum 6061"
